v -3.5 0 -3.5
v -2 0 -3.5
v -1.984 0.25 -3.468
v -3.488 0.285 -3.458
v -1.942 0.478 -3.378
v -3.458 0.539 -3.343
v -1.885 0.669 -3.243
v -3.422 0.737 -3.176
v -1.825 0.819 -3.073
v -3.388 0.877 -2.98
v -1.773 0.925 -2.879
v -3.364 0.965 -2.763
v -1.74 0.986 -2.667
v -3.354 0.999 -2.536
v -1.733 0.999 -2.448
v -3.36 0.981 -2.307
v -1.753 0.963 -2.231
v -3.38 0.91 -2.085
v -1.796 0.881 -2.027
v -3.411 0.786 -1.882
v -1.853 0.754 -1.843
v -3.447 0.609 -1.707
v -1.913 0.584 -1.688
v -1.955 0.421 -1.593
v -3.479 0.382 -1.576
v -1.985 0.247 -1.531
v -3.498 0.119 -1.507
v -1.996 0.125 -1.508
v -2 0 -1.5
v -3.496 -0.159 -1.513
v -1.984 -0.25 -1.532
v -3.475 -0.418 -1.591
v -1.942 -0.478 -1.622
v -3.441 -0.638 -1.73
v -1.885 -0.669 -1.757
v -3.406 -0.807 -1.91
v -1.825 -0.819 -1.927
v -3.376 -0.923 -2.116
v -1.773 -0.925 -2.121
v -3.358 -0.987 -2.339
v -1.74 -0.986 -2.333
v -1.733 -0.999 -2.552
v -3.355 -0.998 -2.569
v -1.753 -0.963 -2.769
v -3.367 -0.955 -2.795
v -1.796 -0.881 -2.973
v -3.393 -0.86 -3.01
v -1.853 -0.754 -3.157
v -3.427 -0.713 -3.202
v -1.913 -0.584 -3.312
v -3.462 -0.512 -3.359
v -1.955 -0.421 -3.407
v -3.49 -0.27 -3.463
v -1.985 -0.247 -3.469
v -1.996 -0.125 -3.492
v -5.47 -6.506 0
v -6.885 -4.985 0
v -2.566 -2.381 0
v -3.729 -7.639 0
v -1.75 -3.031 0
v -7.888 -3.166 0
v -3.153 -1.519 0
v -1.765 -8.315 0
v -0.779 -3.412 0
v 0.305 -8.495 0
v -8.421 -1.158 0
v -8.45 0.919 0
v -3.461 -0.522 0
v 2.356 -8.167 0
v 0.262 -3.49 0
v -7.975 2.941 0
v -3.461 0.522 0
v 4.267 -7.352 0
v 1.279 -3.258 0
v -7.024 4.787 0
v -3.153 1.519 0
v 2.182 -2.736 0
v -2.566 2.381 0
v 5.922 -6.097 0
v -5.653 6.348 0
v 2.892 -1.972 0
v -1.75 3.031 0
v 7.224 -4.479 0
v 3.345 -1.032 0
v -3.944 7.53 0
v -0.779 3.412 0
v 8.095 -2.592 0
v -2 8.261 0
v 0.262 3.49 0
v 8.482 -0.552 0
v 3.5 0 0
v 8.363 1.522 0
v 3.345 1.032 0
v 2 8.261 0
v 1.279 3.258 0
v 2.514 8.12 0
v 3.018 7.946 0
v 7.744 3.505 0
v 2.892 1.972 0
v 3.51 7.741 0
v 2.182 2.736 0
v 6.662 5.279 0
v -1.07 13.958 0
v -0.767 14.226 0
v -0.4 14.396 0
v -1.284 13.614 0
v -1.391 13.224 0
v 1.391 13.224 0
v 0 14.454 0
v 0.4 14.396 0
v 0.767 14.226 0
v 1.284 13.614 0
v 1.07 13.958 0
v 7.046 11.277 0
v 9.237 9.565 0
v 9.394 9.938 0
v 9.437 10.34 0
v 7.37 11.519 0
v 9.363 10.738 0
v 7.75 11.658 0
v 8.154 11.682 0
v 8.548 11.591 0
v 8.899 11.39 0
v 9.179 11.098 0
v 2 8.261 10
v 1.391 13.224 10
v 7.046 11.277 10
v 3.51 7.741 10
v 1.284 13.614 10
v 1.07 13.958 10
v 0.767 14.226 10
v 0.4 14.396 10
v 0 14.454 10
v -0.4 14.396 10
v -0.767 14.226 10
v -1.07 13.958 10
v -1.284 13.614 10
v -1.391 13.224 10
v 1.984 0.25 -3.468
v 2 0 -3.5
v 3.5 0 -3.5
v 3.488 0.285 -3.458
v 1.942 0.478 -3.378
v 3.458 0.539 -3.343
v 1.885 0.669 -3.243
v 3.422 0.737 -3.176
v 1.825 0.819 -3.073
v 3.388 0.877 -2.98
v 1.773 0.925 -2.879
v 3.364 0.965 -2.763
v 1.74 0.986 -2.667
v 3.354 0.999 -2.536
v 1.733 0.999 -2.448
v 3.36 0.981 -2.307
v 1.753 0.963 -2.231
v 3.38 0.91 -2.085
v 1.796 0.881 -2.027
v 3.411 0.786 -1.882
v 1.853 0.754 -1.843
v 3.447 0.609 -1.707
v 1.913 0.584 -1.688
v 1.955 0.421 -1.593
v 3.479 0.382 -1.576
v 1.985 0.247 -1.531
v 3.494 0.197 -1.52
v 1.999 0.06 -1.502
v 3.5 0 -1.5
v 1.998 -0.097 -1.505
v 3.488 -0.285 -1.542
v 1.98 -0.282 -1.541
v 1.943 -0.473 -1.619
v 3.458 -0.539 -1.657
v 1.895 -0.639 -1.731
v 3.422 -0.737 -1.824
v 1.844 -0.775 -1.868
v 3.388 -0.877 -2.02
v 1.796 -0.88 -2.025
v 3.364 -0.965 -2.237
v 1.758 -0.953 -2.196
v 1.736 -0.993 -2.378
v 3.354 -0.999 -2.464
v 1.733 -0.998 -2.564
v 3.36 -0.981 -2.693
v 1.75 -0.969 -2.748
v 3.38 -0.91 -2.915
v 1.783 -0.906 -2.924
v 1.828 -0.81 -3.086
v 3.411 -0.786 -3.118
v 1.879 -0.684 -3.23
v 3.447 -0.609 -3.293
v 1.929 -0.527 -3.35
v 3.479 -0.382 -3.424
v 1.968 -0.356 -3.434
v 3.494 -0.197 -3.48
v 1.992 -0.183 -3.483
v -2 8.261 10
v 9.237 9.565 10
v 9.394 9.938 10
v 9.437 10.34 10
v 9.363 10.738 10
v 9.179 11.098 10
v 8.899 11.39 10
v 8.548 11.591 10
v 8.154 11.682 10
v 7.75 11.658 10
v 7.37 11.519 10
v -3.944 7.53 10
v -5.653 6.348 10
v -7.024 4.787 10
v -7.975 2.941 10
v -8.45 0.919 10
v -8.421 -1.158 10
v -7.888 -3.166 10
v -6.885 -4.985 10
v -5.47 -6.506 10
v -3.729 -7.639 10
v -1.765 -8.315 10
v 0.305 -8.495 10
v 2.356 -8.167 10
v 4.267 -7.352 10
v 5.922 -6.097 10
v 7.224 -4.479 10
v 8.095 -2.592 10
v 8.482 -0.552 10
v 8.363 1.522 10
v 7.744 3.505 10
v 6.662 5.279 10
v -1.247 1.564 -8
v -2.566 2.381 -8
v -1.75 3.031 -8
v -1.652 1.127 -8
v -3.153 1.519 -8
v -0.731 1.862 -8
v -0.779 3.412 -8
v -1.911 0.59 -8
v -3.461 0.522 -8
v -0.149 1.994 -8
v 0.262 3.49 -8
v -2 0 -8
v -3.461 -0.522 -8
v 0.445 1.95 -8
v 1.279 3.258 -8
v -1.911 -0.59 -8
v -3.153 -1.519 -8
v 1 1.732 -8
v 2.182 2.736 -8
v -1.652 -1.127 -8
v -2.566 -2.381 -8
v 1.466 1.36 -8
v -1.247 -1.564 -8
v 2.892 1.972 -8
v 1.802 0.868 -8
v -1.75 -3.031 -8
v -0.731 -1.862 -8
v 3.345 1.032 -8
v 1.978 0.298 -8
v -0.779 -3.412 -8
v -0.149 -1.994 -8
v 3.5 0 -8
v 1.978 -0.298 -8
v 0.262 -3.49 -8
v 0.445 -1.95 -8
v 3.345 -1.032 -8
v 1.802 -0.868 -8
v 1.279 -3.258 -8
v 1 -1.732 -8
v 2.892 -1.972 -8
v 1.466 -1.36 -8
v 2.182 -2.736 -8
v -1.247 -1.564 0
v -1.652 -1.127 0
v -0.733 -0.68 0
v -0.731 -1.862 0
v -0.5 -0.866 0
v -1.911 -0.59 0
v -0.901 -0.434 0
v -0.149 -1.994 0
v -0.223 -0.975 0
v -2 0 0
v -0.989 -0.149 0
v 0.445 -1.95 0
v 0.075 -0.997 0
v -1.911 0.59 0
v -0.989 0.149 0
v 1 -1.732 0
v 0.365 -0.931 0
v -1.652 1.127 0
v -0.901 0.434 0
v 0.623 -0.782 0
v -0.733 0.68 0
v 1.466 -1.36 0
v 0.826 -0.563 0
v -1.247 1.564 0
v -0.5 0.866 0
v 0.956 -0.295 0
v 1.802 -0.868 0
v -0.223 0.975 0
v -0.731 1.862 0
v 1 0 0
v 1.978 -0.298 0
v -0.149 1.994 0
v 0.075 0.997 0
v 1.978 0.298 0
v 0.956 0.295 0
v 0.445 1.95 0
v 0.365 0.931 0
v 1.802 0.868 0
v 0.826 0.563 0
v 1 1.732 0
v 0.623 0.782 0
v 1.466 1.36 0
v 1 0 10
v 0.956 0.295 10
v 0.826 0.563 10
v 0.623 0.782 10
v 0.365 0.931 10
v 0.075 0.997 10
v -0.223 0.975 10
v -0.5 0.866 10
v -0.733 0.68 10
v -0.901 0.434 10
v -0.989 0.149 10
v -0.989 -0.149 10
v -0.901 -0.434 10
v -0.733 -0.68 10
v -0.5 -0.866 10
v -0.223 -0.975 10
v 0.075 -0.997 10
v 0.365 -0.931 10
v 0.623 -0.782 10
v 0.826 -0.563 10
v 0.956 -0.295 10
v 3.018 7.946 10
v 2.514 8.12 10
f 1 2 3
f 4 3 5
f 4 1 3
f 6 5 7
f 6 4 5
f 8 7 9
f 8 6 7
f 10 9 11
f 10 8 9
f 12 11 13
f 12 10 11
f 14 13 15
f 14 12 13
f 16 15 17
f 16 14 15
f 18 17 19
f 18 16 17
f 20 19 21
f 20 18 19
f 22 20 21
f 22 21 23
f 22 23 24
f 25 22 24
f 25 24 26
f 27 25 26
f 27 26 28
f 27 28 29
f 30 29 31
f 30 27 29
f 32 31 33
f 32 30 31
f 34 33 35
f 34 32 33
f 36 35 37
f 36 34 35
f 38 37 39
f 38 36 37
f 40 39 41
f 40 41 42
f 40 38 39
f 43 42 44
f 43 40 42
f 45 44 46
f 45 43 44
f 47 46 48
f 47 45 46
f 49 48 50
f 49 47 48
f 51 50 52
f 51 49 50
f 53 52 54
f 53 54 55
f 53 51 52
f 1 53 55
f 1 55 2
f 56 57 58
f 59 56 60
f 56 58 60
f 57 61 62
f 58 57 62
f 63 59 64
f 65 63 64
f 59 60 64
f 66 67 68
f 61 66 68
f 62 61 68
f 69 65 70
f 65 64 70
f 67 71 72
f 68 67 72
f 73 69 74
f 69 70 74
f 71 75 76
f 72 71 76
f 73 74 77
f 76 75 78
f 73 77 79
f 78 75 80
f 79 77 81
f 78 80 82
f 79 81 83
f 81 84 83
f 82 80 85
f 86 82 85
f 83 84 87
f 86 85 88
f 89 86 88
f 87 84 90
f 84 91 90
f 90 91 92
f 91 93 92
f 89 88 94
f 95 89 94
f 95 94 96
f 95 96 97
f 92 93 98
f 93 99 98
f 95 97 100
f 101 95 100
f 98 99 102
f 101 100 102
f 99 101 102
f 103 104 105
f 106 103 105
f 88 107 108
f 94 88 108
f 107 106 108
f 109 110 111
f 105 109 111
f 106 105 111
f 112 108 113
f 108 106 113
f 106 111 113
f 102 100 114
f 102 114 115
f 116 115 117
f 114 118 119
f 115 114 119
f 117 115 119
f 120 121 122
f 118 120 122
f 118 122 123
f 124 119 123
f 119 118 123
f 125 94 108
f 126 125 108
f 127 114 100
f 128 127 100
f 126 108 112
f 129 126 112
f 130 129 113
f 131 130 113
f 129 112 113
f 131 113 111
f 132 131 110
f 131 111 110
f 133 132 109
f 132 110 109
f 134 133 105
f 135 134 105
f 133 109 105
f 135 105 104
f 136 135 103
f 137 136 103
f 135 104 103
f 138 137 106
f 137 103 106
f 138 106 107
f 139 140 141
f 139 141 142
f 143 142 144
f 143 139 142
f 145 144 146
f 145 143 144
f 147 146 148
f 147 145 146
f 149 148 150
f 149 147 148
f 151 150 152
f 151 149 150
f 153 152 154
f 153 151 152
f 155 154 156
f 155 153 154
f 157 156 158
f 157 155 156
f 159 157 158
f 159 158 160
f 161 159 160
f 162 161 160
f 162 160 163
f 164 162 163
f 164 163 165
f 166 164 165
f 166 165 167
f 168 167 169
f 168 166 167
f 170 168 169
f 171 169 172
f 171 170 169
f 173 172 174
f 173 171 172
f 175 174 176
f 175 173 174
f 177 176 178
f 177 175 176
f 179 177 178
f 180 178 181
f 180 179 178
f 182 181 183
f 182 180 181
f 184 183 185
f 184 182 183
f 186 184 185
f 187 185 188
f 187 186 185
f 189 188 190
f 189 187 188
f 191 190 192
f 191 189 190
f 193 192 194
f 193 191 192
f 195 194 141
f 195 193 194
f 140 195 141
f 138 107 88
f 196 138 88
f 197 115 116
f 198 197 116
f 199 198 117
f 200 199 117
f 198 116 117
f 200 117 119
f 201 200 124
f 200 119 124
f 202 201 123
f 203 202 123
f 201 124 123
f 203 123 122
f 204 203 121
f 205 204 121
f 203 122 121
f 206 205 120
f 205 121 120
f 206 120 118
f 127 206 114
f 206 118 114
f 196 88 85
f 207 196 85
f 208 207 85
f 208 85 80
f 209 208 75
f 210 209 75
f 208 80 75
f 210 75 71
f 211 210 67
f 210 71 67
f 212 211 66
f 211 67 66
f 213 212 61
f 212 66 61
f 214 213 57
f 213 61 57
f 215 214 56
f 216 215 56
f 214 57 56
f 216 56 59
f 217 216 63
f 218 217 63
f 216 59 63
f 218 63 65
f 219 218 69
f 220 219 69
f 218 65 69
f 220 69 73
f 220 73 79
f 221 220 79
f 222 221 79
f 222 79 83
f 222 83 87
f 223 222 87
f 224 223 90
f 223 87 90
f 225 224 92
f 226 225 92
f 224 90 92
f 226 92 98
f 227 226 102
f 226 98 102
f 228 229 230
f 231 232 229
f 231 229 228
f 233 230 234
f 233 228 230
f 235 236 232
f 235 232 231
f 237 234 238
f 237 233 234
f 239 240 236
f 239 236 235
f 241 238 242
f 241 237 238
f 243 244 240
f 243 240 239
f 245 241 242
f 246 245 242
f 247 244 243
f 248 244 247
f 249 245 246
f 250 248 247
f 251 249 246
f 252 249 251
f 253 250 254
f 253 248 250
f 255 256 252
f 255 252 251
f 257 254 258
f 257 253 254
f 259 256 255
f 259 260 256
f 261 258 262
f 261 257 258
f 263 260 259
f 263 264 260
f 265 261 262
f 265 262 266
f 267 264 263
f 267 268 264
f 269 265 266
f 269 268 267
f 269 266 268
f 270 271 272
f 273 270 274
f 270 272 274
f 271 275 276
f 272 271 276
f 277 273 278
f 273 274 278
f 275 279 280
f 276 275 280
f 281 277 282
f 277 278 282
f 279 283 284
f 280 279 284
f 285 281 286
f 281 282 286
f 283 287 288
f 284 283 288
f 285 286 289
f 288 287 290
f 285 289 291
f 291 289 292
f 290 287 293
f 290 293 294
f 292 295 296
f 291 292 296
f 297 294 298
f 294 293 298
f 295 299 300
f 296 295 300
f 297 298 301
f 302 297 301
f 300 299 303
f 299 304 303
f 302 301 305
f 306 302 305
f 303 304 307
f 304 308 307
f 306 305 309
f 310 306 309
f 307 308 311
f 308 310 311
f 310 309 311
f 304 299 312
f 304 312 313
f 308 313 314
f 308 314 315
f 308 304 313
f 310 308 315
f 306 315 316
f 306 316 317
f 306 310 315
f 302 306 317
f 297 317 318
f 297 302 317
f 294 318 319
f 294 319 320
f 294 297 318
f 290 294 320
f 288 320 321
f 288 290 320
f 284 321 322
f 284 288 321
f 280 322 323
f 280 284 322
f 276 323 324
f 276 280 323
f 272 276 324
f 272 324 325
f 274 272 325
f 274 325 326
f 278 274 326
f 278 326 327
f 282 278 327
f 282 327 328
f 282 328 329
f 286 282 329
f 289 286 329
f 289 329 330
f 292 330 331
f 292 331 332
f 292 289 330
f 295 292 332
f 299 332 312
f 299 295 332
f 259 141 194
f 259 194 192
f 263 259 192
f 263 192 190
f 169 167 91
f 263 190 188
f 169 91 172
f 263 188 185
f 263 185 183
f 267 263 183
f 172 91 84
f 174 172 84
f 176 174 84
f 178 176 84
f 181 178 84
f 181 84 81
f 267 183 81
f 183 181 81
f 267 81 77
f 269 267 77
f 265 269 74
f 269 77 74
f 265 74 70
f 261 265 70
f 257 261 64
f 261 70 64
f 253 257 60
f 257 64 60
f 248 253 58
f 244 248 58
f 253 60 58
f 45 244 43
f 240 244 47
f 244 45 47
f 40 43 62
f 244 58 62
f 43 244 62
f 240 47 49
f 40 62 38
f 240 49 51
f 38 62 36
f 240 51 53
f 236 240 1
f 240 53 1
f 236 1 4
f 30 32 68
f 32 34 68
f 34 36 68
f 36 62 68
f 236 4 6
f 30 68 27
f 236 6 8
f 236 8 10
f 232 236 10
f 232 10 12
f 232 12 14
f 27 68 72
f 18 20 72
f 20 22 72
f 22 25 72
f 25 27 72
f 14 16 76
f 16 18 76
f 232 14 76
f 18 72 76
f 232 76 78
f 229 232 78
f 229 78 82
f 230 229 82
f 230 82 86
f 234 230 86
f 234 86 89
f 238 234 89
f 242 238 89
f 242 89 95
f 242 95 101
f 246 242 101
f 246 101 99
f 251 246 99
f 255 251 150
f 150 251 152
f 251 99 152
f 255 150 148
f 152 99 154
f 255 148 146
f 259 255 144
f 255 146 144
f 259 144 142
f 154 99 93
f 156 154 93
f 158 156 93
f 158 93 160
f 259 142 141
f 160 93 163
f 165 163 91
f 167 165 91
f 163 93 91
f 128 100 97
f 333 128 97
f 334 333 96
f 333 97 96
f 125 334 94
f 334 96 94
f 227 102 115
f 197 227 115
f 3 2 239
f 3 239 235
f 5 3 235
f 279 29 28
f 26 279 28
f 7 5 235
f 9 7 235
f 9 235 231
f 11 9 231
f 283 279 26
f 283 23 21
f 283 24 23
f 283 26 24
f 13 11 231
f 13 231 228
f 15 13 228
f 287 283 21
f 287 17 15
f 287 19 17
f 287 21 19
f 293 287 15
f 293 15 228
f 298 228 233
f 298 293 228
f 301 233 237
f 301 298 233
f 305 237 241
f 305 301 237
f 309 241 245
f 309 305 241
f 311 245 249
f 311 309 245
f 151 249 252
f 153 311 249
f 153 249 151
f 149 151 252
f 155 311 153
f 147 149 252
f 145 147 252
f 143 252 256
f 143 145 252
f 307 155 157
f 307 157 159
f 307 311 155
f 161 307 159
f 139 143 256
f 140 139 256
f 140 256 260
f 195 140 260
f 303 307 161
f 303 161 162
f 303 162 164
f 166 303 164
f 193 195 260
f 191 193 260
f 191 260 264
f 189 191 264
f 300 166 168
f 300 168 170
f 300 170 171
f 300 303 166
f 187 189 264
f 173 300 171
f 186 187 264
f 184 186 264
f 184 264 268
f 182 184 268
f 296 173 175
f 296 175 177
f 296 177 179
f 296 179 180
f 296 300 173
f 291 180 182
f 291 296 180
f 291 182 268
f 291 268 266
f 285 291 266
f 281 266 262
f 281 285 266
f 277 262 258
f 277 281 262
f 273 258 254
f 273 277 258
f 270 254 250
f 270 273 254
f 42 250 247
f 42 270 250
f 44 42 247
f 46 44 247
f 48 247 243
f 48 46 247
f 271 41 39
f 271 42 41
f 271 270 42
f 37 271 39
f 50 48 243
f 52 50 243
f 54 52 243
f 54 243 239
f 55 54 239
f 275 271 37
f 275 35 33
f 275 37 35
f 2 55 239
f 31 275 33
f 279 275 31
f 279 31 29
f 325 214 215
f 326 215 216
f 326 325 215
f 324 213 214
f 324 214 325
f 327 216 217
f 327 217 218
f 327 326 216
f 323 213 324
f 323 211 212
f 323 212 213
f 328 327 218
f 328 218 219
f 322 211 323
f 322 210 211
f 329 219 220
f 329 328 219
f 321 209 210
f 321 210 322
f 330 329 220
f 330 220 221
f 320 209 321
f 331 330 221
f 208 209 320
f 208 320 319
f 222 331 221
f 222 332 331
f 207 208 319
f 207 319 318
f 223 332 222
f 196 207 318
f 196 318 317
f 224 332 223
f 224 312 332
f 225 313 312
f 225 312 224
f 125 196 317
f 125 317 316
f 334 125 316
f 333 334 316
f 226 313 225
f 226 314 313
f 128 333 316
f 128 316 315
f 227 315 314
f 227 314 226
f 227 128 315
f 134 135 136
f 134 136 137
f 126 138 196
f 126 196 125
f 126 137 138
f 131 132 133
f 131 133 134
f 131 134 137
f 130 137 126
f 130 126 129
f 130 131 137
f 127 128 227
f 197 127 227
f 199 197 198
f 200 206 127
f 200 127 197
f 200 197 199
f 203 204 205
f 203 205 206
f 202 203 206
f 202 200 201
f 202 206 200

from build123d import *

# Parameters (mm, degrees)
SKETCH1_R               = 1
BOSS_EXTRUDE1_DEPTH     = 10
SKETCH5_R               = 3.5
SKETCH5_R_2             = 2
BOSS_EXTRUDE3_DEPTH     = 8
CUT_EXTRUDE1_DEPTH      = 20.949878445
CUT_EXTRUDE1_DEPTH_BACK = 20.949878445
SKETCH6_R               = 1


with BuildPart() as part:
    # Sketch1 → Boss-Extrude1 (new body)
    with BuildSketch(Plane.XY):
        with BuildLine():
            Line((-1.390653283, 13.224086579), (-2, 8.261355821))
            ThreePointArc((-2, 8.261355821), (-2.767329313, -8.036907893), (6.66222002, 5.278714276))
            Line((6.66222002, 5.278714276), (9.237410395, 9.564550779))
            ThreePointArc((9.237410395, 9.564550779), (8.899037344, 11.390248383), (7.045710912, 11.276894083))
            Line((7.045710912, 11.276894083), (3.510177006, 7.741360177))
            ThreePointArc((3.510177006, 7.741360177), (2.767329313, 8.036907893), (2, 8.261355821))
            Line((2, 8.261355821), (1.390653283, 13.224086579))
            ThreePointArc((1.390653283, 13.224086579), (0, 14.454432673), (-1.390653283, 13.224086579))
        make_face()
        Circle(SKETCH1_R, mode=Mode.SUBTRACT)
    extrude(amount=BOSS_EXTRUDE1_DEPTH)

    # Sketch5 → Boss-Extrude3 (add)
    with BuildSketch(Plane(origin=(0, 0, 0), x_dir=(-1, 0, 0), z_dir=(0, 0, -1))):
        with Locations(Location((0, 0, 0), (0, 0, 180))):
            Circle(SKETCH5_R)
        Circle(SKETCH5_R_2, mode=Mode.SUBTRACT)
    extrude(amount=BOSS_EXTRUDE3_DEPTH)

    # Sketch6 → Cut-Extrude1 (cut, two sides: drawn at the far end of the back side and taken through both)
    with BuildSketch(Plane(origin=(0, 0, 0), x_dir=(0, 0, -1), z_dir=(1, 0, 0)).offset(-CUT_EXTRUDE1_DEPTH_BACK)):
        with Locations((2.5, 0)):
            Circle(SKETCH6_R)
    extrude(amount=CUT_EXTRUDE1_DEPTH + CUT_EXTRUDE1_DEPTH_BACK, mode=Mode.SUBTRACT)


solid = part.part
